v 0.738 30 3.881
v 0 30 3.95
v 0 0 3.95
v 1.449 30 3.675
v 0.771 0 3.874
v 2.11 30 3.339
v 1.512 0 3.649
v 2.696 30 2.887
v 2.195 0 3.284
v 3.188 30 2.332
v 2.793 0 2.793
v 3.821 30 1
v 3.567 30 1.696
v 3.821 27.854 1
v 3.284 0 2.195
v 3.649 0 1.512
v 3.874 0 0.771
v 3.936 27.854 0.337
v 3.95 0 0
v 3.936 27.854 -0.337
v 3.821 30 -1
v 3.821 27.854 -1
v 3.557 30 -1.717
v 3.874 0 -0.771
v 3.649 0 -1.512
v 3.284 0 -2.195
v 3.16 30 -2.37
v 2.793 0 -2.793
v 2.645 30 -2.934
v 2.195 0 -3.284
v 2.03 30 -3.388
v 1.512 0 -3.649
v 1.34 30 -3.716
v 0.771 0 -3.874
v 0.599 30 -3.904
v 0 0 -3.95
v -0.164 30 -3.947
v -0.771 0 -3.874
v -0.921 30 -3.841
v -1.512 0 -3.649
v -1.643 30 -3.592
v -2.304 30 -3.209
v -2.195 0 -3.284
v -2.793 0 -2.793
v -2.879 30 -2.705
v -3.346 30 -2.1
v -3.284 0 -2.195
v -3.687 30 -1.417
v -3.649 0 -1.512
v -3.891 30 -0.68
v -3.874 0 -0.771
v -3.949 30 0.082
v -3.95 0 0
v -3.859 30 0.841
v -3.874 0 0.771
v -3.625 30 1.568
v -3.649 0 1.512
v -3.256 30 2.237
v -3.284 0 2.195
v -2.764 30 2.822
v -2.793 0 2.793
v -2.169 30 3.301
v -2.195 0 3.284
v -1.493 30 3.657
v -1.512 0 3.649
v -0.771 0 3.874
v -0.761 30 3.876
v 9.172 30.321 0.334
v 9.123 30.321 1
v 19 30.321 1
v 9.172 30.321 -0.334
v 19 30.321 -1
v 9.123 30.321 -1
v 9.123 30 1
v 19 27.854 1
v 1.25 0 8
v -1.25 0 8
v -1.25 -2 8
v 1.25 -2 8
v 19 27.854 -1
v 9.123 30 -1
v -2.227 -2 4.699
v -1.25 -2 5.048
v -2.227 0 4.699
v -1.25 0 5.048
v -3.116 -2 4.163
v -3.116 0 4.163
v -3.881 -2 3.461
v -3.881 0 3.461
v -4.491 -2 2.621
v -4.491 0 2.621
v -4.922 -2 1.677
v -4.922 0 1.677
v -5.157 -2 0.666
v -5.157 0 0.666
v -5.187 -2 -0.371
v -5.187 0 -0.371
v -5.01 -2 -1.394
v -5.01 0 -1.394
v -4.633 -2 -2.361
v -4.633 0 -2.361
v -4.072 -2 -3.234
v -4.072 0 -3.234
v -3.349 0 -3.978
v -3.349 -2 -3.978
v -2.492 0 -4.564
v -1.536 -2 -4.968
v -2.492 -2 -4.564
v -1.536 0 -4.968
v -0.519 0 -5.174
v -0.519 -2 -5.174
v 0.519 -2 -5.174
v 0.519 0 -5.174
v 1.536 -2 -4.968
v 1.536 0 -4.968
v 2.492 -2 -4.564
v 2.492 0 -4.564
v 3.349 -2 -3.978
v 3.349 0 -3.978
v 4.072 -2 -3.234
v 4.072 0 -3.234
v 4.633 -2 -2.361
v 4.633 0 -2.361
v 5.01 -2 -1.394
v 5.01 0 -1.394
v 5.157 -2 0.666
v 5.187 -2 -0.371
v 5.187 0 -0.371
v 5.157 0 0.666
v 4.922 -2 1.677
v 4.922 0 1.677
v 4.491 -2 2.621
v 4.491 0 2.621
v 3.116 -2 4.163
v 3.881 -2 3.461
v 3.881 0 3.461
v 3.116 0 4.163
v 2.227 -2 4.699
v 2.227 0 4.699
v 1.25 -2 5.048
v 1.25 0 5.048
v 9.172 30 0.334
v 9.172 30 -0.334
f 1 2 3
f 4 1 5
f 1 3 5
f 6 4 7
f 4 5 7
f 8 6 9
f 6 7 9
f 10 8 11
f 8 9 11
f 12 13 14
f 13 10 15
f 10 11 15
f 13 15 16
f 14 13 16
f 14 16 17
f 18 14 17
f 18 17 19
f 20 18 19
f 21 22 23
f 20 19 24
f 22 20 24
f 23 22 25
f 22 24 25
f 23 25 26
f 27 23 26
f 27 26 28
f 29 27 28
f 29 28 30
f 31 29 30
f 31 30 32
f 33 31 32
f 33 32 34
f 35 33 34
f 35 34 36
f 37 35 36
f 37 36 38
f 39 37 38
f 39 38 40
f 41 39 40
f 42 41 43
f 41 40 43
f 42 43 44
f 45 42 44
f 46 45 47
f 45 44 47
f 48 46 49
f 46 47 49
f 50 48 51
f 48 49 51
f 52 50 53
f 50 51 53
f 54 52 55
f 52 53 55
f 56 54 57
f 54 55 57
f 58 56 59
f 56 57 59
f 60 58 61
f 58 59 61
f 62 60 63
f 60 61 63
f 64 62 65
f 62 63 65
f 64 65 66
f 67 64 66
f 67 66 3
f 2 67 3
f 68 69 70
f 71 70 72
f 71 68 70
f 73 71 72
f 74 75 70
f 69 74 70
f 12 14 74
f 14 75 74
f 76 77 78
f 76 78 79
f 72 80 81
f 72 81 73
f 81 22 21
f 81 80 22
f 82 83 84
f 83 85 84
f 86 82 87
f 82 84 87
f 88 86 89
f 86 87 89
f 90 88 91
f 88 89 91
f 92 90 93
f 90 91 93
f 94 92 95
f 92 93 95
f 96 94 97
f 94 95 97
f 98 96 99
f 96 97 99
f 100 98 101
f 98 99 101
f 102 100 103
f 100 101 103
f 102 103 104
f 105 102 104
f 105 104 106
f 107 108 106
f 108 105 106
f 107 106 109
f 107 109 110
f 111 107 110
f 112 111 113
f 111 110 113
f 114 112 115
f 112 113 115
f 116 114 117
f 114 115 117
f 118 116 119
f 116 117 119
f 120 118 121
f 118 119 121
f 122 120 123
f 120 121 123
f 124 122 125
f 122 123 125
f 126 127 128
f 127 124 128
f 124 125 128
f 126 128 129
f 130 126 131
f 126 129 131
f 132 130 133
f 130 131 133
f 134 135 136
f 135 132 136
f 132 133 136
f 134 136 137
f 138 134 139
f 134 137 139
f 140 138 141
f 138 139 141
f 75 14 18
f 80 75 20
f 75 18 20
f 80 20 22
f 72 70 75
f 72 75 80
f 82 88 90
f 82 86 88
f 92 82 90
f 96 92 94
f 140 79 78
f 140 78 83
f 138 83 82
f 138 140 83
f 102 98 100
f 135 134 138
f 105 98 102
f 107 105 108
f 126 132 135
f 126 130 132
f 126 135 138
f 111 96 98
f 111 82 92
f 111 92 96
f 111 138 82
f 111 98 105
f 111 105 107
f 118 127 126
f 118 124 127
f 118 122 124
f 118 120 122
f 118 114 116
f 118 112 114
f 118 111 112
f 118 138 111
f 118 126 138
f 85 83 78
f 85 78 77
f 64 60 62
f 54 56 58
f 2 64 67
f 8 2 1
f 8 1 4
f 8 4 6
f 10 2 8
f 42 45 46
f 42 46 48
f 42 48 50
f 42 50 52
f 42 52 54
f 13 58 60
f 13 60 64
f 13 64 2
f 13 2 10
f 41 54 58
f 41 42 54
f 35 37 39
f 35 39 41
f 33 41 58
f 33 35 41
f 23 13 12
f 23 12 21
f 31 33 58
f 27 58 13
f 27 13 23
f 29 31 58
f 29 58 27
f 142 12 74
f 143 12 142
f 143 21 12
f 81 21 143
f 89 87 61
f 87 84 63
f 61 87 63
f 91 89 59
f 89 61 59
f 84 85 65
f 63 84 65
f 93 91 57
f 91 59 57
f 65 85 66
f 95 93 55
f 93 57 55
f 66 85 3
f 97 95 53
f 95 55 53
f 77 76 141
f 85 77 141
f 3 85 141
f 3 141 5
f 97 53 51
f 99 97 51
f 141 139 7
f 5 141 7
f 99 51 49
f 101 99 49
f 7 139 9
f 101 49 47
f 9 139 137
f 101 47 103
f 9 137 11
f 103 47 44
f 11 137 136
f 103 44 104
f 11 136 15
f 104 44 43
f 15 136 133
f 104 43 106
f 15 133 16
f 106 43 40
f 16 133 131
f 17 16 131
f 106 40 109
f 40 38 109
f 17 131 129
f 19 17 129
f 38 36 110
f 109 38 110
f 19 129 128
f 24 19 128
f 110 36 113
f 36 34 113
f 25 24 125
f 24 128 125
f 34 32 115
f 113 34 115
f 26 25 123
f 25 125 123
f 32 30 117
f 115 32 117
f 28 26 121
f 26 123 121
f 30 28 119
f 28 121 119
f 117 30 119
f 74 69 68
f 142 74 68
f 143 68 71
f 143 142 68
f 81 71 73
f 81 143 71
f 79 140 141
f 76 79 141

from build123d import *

# Parameters (mm, degrees)
SKETCH1_R           = 3.95
BOSS_EXTRUDE1_DEPTH = 30
SKETCH2_R           = 5.2
BOSS_EXTRUDE2_DEPTH = 2
SKETCH5_W           = 2
SKETCH5_H           = 2.467717667
BOSS_EXTRUDE3_DEPTH = 19
SKETCH6_R           = 9.177685327
CUT_EXTRUDE1_DEPTH  = 0.321276311
SKETCH8_W           = 2.5
SKETCH8_H           = 2
BOSS_EXTRUDE4_DEPTH = 8


with BuildPart() as part:
    # Sketch1 → Boss-Extrude1 (new body)
    with BuildSketch(Plane(origin=(0, 0, 0), x_dir=(1, 0, 0), z_dir=(0, 1, 0))):
        with Locations(Location((0, 0, 0), (0, 0, 270))):
            Circle(SKETCH1_R)
    extrude(amount=BOSS_EXTRUDE1_DEPTH)

    # Sketch2 → Boss-Extrude2 (add)
    with BuildSketch(Plane.XZ):
        with Locations(Location((0, 0, 0), (0, 0, 270))):
            Circle(SKETCH2_R)
    extrude(amount=BOSS_EXTRUDE2_DEPTH)

    # Sketch5 → Boss-Extrude3 (add)
    with BuildSketch(Plane(origin=(0, 0, 0), x_dir=(0, 0, -1), z_dir=(1, 0, 0))):
        with Locations((0, 29.087417478)):
            Rectangle(SKETCH5_W, SKETCH5_H)
    extrude(amount=BOSS_EXTRUDE3_DEPTH)

    # Sketch6 → Cut-Extrude1 (cut)
    with BuildSketch(Plane(origin=(0, 30, 0), x_dir=(1, 0, 0), z_dir=(0, 1, 0))):
        Circle(SKETCH6_R)
    extrude(amount=CUT_EXTRUDE1_DEPTH, mode=Mode.SUBTRACT)

    # Sketch8 → Boss-Extrude4 (add)
    with BuildSketch(Plane.XY):
        with Locations((0, -1)):
            Rectangle(SKETCH8_W, SKETCH8_H)
    extrude(amount=BOSS_EXTRUDE4_DEPTH)


solid = part.part
